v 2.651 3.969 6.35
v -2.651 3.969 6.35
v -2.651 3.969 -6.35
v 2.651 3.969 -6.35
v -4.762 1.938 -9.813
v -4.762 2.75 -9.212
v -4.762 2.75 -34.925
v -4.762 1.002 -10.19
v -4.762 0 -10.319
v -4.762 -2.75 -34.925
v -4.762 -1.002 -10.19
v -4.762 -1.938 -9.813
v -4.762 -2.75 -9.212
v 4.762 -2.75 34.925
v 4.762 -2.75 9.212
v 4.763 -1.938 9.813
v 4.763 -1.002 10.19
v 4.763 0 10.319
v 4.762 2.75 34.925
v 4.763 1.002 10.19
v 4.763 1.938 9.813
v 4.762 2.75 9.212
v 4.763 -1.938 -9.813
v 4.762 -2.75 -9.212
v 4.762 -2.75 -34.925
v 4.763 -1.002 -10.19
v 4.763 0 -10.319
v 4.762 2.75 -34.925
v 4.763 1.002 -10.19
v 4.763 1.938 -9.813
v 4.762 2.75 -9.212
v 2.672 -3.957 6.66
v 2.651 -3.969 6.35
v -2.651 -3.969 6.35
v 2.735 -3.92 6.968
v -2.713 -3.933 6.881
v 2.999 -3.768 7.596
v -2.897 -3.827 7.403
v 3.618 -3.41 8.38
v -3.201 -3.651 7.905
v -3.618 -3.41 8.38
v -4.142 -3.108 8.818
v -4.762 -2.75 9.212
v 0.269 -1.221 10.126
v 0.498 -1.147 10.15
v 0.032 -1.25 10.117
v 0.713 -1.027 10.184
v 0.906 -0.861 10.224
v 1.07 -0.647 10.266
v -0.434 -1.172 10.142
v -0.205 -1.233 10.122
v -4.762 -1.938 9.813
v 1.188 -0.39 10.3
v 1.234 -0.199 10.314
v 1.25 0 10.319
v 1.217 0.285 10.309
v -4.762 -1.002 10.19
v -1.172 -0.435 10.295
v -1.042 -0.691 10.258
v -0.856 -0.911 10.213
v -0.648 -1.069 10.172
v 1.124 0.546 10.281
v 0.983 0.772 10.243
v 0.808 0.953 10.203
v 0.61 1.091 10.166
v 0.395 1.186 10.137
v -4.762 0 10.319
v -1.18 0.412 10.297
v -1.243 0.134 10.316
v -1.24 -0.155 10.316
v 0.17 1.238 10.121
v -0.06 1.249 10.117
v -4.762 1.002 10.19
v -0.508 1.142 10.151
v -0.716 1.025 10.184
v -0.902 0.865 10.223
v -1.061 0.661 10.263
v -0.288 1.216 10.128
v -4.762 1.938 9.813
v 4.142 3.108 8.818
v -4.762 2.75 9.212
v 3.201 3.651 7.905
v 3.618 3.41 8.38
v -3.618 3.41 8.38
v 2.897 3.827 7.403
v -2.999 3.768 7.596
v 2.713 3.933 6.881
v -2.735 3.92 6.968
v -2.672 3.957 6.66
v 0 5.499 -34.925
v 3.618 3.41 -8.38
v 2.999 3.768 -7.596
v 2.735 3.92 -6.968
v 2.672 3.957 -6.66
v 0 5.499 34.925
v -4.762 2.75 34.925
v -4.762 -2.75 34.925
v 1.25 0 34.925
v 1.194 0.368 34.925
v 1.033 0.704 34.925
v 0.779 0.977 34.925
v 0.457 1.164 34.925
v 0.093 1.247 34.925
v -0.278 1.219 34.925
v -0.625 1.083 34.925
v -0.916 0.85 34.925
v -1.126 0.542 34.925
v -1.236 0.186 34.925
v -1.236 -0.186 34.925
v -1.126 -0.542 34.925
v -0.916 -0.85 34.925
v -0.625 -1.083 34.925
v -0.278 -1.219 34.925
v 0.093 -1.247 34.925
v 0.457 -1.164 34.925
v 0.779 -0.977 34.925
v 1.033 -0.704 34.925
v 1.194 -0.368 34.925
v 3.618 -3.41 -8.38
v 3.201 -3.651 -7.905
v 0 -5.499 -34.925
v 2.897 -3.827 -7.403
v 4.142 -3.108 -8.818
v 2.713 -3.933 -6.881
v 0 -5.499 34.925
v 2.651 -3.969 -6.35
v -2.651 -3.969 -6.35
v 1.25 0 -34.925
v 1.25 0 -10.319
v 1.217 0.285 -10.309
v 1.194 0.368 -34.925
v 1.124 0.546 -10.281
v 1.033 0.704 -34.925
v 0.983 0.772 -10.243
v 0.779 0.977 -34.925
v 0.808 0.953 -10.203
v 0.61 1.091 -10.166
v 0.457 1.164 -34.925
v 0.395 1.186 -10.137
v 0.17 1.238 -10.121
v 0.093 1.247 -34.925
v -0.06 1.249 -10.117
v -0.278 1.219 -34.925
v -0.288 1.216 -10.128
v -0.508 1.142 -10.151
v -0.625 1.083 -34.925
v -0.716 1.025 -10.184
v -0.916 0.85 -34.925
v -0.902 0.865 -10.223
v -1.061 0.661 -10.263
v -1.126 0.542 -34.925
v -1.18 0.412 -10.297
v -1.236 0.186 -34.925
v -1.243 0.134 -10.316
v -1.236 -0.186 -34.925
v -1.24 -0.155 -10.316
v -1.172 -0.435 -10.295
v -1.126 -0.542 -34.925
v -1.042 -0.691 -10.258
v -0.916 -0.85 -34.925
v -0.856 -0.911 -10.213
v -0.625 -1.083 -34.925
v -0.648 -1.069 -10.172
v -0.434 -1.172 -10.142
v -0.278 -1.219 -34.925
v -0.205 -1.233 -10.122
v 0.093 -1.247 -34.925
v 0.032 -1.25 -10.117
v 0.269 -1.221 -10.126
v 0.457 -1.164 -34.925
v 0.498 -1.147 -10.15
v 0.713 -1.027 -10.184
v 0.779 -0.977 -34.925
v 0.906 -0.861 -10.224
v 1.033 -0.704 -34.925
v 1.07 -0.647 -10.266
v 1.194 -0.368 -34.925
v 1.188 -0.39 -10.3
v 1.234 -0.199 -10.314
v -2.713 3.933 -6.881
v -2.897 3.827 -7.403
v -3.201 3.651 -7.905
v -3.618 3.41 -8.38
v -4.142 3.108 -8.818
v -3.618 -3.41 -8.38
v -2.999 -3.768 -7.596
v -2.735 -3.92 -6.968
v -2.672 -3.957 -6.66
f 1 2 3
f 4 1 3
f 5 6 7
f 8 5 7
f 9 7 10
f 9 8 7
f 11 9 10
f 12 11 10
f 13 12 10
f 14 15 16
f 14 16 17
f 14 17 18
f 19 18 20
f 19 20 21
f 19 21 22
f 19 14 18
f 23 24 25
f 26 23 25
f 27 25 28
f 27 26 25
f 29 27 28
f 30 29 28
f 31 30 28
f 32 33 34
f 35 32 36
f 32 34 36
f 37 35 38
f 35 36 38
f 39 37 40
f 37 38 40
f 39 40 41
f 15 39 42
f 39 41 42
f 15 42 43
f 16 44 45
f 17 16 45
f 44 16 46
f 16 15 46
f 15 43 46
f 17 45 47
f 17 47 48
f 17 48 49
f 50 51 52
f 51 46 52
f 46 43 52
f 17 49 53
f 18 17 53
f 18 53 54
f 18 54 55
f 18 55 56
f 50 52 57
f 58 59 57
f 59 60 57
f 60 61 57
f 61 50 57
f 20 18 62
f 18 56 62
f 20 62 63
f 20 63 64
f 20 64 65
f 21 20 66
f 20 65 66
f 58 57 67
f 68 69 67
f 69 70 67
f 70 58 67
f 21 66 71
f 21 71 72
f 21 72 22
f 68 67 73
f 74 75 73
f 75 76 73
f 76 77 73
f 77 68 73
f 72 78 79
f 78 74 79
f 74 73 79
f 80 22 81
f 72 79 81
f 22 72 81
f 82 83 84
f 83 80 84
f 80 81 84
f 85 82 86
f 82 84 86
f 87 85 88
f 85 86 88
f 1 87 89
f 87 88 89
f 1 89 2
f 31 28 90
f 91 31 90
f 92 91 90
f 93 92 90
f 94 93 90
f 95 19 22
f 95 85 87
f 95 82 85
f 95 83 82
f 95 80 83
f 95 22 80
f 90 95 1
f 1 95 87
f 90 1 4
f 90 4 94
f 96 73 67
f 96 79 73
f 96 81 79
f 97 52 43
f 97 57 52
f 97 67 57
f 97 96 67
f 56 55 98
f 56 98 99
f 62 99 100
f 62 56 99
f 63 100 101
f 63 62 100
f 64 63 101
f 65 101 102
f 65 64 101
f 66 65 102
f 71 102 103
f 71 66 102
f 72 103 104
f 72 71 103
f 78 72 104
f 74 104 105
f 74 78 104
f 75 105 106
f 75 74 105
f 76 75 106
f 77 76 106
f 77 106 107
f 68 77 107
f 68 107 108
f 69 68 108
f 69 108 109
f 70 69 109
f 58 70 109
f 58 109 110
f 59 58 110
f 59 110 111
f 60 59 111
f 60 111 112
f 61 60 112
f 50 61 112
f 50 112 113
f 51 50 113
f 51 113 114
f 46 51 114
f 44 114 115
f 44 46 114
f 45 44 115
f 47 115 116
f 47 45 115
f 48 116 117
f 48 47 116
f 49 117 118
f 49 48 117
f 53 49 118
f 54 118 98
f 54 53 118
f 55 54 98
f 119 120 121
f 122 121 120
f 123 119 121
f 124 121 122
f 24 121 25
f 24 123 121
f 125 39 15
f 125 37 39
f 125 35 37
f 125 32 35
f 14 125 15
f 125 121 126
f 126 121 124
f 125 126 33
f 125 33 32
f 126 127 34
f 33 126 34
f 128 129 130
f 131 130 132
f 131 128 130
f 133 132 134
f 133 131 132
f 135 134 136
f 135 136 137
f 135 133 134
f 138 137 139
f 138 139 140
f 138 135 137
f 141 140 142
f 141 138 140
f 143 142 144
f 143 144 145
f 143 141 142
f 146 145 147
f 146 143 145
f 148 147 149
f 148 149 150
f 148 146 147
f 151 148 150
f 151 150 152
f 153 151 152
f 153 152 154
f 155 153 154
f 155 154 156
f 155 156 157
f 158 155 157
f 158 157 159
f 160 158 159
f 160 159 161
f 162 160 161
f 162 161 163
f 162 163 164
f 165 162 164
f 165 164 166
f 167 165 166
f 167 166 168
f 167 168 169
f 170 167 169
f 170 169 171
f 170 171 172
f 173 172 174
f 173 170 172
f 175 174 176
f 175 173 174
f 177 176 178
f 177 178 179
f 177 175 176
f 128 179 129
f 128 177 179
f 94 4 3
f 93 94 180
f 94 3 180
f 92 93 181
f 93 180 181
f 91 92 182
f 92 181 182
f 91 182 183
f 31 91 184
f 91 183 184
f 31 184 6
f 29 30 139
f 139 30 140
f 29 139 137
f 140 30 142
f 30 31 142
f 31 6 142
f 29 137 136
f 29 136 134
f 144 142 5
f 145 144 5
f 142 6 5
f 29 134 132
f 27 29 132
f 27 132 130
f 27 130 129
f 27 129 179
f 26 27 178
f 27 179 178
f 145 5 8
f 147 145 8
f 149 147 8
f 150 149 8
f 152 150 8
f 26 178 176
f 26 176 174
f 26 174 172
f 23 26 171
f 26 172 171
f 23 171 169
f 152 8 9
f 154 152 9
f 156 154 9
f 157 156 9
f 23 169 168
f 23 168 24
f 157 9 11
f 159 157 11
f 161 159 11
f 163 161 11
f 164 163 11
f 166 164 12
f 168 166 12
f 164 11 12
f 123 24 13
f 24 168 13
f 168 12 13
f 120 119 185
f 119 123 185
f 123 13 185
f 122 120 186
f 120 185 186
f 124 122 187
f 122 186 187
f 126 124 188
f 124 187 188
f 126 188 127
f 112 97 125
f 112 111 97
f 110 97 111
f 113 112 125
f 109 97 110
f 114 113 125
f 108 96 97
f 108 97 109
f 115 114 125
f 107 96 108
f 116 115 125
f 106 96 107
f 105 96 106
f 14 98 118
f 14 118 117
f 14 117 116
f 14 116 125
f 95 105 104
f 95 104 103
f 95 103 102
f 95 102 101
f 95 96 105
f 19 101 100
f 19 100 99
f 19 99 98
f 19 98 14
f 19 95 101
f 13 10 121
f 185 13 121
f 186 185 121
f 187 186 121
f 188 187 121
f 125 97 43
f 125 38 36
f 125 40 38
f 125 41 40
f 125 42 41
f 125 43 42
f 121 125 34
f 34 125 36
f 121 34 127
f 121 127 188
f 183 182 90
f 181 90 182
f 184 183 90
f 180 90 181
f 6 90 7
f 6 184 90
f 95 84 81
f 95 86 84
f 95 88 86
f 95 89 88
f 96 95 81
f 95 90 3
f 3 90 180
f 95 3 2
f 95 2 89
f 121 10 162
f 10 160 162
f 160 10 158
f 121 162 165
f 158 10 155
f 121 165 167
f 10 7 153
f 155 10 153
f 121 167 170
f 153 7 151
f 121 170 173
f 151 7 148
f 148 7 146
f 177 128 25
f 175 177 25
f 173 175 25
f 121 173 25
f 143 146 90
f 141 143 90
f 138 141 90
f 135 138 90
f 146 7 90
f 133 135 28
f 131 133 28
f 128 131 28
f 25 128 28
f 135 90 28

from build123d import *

# Parameters (mm, degrees)
BOSS_EXTRUDE1_DEPTH     = 34.925
CUT_EXTRUDE4_DEPTH      = 36.674625524
CUT_EXTRUDE4_DEPTH_BACK = 36.674625524
CUT_EXTRUDE5_DEPTH      = 36.674625524
CUT_EXTRUDE5_DEPTH_BACK = 36.674625524
SKETCH6_R               = 1.25


with BuildPart() as part:
    # Sketch1 → Boss-Extrude1 (new, symmetric)
    with BuildSketch(Plane.XY):
        Polygon((0, 5.499261314), (-4.7625, 2.749630657), (-4.7625, -2.749630657), (0, -5.499261314), (4.7625, -2.749630657), (4.7625, 2.749630657), align=None)
    extrude(amount=BOSS_EXTRUDE1_DEPTH, both=True)

    # Sketch5 → Cut-Extrude4 (cut, two sides: drawn at the far end of the back side and taken through both)
    with BuildSketch(Plane(origin=(0, 0, 0), x_dir=(0, 0, -1), z_dir=(1, 0, 0)).offset(-CUT_EXTRUDE4_DEPTH_BACK)):
        with BuildLine():
            Line((-6.35, 3.96875), (6.35, 3.96875))
            ThreePointArc((6.35, 3.96875), (10.31875, 0), (6.35, -3.96875))
            Line((6.35, -3.96875), (-6.35, -3.96875))
            ThreePointArc((-6.35, -3.96875), (-10.31875, 0), (-6.35, 3.96875))
        make_face()
    extrude(amount=CUT_EXTRUDE4_DEPTH + CUT_EXTRUDE4_DEPTH_BACK, mode=Mode.SUBTRACT)

    # Sketch6 → Cut-Extrude5 (cut, two sides: drawn at the far end of the back side and taken through both)
    with BuildSketch(Plane.XY.offset(-CUT_EXTRUDE5_DEPTH_BACK)):
        Circle(SKETCH6_R)
    extrude(amount=CUT_EXTRUDE5_DEPTH + CUT_EXTRUDE5_DEPTH_BACK, mode=Mode.SUBTRACT)


solid = part.part
